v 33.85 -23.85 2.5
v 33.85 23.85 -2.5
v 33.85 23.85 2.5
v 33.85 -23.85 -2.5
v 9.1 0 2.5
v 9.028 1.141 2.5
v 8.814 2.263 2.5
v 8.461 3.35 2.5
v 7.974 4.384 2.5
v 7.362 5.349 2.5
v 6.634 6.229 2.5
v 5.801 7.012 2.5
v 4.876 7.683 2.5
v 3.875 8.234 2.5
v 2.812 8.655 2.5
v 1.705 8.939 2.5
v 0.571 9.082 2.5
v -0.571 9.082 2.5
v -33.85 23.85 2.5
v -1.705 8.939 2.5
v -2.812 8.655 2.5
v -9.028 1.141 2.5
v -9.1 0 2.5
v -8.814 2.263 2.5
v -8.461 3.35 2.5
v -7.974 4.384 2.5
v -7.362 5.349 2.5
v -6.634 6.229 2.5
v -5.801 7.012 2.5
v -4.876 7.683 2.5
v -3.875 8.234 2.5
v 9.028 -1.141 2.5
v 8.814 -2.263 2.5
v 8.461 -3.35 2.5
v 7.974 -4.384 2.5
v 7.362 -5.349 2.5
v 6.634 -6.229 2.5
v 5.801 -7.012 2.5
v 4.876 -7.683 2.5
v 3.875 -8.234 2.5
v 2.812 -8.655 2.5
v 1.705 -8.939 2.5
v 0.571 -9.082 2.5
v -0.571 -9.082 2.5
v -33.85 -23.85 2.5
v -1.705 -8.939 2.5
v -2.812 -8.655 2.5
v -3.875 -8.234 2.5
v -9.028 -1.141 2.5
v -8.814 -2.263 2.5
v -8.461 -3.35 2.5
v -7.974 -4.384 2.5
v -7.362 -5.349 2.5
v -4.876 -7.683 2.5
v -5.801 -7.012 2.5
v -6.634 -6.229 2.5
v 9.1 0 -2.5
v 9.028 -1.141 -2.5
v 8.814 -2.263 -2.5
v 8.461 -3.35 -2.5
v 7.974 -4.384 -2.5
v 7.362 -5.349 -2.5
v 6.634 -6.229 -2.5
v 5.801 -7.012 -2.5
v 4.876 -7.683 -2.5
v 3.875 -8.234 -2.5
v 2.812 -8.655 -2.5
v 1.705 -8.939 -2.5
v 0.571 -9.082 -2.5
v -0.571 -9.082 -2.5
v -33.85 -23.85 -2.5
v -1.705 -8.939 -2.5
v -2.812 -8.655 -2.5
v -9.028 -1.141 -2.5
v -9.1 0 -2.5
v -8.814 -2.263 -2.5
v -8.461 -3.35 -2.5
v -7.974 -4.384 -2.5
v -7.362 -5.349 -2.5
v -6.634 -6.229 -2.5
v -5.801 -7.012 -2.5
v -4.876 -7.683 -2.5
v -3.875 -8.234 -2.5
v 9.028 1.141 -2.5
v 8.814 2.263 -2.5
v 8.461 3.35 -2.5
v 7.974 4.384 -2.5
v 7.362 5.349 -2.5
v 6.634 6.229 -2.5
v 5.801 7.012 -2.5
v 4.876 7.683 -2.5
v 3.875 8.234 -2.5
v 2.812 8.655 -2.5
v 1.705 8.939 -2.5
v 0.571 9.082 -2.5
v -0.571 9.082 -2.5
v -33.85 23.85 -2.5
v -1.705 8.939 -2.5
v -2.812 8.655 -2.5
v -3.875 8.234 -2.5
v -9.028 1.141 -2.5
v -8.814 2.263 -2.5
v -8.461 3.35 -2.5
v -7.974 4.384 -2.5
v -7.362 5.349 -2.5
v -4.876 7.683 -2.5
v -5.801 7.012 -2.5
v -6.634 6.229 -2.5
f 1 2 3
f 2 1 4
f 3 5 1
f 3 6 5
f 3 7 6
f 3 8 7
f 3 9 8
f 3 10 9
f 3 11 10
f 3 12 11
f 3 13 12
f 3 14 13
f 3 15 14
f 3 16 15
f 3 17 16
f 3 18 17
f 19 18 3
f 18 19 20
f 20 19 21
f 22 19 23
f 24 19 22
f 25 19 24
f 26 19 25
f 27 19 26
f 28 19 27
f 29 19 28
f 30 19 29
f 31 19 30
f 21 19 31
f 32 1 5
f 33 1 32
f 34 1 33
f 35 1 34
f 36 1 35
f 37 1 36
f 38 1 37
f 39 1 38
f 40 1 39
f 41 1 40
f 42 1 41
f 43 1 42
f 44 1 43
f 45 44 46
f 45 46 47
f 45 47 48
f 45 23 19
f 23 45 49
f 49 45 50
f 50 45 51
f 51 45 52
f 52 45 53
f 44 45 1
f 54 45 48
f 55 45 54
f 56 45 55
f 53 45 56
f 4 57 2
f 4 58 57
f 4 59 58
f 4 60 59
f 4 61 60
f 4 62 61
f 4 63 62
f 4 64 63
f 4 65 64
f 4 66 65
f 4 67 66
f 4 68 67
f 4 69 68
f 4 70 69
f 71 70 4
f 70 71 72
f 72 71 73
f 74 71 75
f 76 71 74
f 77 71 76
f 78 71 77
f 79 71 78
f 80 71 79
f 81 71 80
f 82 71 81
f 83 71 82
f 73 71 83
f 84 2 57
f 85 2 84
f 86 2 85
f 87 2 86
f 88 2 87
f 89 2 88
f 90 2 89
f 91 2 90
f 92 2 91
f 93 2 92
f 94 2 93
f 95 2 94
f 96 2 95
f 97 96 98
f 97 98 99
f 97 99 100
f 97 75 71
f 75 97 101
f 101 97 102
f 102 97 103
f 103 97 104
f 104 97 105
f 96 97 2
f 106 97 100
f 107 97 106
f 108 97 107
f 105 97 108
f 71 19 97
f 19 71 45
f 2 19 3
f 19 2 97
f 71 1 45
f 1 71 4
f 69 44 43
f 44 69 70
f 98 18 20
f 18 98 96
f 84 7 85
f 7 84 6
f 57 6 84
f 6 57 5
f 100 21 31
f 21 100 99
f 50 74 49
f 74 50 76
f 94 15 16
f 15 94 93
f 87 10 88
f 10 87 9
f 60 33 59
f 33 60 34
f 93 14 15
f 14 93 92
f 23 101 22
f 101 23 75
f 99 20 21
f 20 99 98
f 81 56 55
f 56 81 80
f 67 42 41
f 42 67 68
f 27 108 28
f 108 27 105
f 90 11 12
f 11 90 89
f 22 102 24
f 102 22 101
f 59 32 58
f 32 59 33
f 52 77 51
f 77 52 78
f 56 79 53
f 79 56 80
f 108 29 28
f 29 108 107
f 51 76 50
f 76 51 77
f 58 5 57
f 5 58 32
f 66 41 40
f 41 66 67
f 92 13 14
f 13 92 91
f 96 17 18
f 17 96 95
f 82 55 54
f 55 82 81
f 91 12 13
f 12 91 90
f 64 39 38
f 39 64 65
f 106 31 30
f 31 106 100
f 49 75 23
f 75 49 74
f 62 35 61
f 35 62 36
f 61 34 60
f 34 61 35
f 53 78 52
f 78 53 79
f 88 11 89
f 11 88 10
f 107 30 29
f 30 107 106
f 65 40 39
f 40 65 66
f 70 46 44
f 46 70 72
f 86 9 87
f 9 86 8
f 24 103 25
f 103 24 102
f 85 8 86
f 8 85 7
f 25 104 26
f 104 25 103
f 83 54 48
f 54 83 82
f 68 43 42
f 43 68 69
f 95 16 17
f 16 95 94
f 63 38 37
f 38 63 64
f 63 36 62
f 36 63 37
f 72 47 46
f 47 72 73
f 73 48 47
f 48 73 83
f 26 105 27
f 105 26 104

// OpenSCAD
// Global constants
print_comp = 0.1;  // compensation for (unwanted) additional material being extruded bei 3d printer
// the model's resolution
model_resolution = 50;


/*
  x = direction along the sheet material
  y = perpendicular to the direction along sheet edge
*/

/* The first printed edge jig did not include ceil() to not frame dimensions */
router_jig_inlay_circle(
    inlay_x = 67.9 - 2*print_comp,
    inlay_y = 47.9 - 2*print_comp,
    circle_dia = 18);


/* The first printed edge jig did not include rounded inlay frame dimensions */


/* Inlay for the router edge jig that will allow to mill a circle into an edge */
module router_jig_inlay_circle(
  inlay_x,    // outer x length
  inlay_y,    // outer y length
  circle_dia  // diameter of milled circle
  ) {
    // fixed values derived from router dimensions and experience
    jig_h = 5;  // jig height (or strength)
    difference() {
        cube([inlay_x, inlay_y, jig_h], center=true);
        cylinder(h=2*jig_h, d=circle_dia+2*print_comp, center=true, $fn=model_resolution);
    }
}


/* Inlay for the router edge jig that will allow to mill a circle into an edge */
module router_jig_inlay_rect(
  inlay_x,  // outer x length
  inlay_y,  // outer y length
  rect_x,   // milled length in x
  rect_y    // milled length in y
  ) {
    // fixed values derived from router dimensions and experience
    jig_h = 5;  // jig height (or strength)
    difference() {
        cube([inlay_x, inlay_y, jig_h], center=true);
        cube([rect_x, rect_y, 2*jig_h], center=true);
    }
}
